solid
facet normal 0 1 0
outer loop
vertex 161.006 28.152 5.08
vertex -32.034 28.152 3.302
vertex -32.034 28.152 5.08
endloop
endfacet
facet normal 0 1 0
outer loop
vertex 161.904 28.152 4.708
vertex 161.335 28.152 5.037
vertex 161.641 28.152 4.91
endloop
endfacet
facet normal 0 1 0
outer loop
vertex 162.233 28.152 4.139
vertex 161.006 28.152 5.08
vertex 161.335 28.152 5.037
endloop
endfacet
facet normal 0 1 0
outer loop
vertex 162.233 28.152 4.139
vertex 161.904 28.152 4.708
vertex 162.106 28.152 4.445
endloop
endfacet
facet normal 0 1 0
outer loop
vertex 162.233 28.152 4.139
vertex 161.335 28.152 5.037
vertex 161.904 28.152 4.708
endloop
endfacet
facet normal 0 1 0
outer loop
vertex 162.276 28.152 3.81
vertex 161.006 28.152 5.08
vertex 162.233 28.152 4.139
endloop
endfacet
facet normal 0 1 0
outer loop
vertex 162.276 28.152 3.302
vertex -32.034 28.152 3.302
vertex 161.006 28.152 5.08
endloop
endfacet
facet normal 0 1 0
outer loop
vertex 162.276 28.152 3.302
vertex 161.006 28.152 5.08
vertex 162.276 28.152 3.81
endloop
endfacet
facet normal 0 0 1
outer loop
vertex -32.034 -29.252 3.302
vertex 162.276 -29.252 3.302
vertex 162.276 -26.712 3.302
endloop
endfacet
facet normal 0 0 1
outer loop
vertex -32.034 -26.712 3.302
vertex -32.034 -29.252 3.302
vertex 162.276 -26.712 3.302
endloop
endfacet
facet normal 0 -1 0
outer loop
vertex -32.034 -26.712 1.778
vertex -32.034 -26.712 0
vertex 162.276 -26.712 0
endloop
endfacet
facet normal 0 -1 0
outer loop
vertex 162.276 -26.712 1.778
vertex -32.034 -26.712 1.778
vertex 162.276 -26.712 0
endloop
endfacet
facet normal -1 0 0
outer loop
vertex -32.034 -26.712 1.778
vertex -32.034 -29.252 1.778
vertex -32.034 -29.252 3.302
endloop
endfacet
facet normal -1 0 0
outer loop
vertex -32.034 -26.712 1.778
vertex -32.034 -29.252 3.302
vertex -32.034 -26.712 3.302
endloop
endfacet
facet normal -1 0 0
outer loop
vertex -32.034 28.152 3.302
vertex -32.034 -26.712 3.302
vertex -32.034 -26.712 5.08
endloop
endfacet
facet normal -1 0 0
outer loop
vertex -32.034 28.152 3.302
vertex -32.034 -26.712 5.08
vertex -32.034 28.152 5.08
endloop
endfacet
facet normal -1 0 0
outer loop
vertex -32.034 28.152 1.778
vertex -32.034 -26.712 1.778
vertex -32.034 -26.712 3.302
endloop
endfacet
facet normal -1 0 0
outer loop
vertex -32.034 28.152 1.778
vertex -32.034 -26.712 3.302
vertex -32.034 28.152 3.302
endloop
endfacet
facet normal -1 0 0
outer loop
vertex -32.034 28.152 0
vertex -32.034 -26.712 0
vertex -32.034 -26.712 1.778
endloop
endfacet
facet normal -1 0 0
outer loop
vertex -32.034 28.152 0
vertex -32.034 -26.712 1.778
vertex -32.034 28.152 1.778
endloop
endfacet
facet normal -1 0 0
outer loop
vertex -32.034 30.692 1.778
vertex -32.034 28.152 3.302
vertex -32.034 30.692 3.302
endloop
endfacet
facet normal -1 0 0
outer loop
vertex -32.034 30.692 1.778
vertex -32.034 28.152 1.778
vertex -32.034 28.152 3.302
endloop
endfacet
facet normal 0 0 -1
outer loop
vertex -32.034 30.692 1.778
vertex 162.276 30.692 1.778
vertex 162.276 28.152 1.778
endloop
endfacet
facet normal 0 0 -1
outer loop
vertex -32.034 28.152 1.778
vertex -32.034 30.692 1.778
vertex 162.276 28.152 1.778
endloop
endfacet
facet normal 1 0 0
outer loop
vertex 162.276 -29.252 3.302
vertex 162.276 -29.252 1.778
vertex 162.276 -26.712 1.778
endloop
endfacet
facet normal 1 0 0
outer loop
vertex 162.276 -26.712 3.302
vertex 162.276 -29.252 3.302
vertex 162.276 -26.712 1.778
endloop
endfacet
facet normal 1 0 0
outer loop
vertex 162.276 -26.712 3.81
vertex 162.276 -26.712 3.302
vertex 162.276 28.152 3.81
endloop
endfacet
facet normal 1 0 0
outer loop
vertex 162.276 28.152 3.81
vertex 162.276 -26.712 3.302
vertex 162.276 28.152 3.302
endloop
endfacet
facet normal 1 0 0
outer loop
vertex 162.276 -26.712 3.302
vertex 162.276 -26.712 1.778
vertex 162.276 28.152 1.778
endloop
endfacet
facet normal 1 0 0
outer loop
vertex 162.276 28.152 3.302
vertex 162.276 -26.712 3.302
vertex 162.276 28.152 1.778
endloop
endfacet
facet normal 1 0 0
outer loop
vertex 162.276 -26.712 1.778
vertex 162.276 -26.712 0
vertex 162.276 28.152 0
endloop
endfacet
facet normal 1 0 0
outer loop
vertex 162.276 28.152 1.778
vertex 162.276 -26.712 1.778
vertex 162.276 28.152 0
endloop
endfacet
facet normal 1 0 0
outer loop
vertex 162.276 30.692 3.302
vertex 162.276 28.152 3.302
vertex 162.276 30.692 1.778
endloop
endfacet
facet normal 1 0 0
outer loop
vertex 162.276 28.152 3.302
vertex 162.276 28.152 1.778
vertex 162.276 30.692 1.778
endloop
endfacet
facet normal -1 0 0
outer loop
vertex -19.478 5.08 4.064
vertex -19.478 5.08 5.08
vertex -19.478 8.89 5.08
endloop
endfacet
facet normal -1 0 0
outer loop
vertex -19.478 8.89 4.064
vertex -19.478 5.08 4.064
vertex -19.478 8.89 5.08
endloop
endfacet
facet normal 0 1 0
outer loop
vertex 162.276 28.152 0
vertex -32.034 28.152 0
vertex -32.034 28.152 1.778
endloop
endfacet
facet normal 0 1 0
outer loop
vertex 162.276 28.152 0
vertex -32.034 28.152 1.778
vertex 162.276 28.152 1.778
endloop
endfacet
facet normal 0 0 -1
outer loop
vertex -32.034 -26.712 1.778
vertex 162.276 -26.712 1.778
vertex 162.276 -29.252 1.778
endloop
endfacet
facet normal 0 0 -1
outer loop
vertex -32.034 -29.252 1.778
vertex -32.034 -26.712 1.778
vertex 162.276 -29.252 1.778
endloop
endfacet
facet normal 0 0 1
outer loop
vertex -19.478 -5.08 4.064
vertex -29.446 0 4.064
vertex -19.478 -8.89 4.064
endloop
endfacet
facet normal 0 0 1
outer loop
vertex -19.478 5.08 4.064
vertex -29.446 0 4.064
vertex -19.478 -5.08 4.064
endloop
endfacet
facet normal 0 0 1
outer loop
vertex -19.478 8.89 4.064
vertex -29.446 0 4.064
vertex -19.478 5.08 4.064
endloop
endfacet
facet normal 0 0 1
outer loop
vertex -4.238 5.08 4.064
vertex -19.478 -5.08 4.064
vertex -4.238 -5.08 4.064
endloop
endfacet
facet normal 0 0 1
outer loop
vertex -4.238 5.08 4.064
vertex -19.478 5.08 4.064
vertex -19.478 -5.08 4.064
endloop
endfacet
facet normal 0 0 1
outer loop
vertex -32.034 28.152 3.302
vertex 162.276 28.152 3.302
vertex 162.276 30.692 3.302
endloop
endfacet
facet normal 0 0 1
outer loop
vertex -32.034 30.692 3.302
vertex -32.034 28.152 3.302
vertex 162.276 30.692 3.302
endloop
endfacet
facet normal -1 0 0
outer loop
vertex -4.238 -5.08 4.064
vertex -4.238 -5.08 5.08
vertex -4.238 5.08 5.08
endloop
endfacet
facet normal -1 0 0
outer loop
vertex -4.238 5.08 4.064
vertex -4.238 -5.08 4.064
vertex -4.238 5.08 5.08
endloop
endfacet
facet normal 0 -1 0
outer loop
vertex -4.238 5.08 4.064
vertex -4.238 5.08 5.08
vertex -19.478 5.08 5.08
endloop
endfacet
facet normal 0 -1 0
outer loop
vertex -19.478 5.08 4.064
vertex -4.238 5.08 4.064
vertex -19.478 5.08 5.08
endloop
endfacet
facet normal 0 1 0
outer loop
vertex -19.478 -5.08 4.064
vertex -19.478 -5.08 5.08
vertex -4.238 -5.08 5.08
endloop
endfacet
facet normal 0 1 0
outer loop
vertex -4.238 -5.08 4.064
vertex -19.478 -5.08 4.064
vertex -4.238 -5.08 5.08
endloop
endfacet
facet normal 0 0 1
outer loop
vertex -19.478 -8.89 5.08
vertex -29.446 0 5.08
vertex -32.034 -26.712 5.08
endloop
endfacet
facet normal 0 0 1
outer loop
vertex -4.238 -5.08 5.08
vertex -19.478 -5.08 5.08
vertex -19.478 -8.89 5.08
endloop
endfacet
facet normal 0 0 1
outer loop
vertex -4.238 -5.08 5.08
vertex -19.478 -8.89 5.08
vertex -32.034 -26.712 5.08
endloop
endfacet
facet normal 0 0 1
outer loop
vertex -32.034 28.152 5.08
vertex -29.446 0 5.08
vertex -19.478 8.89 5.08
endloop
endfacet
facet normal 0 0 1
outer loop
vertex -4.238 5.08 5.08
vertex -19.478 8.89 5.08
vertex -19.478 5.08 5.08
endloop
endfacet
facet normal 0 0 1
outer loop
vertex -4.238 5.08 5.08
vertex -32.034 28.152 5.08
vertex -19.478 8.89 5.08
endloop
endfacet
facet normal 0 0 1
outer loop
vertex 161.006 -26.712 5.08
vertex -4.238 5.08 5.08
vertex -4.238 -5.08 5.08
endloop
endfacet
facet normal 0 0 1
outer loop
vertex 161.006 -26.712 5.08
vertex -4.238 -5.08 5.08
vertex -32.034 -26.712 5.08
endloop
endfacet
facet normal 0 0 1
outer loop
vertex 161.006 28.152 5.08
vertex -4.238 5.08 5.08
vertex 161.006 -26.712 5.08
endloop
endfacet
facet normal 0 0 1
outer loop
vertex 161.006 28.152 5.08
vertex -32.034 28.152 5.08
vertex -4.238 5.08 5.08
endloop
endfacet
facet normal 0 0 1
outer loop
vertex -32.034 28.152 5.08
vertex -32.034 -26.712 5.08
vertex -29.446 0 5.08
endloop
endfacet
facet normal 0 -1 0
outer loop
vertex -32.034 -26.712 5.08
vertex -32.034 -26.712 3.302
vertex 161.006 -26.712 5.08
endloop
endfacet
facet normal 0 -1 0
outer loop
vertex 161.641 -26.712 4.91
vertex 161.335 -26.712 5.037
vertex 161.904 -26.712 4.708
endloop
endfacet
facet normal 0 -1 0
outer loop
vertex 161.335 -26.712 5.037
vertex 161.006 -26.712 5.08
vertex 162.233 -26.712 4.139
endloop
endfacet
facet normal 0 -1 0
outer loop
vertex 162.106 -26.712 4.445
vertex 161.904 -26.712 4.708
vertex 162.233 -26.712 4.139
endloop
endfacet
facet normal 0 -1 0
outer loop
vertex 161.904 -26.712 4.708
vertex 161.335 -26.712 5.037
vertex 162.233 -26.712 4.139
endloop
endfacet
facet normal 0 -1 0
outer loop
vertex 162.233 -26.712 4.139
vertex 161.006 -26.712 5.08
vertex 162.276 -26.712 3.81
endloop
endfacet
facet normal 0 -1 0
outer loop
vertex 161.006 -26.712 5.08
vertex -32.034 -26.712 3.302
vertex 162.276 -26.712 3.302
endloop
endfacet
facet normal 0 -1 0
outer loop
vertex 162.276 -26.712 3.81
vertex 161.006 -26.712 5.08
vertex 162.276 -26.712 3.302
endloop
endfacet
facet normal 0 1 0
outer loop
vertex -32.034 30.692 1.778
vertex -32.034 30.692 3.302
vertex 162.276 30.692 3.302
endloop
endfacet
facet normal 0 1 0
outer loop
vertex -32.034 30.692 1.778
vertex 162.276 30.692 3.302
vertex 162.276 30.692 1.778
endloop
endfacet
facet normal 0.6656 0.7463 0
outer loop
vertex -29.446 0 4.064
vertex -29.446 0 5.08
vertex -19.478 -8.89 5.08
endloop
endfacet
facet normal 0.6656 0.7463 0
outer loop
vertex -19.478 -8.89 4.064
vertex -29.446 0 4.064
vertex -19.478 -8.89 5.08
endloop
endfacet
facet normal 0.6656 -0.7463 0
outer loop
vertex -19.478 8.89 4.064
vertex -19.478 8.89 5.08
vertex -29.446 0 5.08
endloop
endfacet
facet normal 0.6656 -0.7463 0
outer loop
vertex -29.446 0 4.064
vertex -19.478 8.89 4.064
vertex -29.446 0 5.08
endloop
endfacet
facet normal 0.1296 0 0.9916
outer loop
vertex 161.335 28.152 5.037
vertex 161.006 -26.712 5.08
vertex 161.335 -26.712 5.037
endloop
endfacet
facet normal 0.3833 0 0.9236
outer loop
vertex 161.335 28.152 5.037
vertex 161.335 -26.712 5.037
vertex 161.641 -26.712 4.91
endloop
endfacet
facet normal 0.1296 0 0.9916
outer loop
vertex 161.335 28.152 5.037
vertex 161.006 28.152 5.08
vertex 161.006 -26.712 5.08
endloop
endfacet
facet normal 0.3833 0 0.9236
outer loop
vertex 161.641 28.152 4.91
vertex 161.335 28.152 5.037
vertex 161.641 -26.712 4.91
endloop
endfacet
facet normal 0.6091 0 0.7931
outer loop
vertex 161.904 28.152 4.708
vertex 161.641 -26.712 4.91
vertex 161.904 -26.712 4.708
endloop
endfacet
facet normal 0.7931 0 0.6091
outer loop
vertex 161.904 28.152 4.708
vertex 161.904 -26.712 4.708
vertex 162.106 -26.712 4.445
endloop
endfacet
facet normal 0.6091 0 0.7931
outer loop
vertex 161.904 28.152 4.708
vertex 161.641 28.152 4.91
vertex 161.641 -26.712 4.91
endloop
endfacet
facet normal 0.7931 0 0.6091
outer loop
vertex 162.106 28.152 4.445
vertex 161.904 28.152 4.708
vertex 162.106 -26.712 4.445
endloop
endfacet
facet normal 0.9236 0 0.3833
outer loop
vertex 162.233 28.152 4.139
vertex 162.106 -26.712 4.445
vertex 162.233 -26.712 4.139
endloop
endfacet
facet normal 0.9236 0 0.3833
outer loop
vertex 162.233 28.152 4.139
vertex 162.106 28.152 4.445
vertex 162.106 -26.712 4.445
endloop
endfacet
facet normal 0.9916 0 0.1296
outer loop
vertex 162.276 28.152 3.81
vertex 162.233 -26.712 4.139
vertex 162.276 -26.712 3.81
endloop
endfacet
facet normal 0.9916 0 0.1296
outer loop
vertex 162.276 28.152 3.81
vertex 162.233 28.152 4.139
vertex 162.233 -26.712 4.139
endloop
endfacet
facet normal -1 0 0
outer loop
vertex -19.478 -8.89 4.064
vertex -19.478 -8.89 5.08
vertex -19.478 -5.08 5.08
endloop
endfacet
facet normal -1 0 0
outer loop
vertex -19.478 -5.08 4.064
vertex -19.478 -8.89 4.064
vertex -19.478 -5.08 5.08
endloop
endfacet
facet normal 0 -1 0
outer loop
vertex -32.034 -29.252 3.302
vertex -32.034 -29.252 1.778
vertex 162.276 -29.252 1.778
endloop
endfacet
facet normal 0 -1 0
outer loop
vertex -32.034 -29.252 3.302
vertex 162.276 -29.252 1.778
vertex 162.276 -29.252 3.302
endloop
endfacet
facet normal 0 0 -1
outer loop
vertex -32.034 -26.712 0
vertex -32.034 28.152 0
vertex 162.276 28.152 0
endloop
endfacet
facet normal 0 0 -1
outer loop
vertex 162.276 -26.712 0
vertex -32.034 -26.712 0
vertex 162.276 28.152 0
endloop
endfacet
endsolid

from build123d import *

# Parameters (mm, degrees)
F0_W     = 194.31
F0_H     = 54.864
F1_DEPTH = 5.08
F3_DEPTH = 194.31
F4_R     = 1.27
F6_DEPTH = 1.016


with BuildPart() as f1:
    # F0 (on Top) → F1 (new body)
    with BuildSketch(Plane.XY):
        with Locations((65.120992, 0.720159)):
            Rectangle(F0_W, F0_H)
    extrude(amount=F1_DEPTH)

    # F2 (on face) → F3 (join, through all)
    with BuildSketch(Plane(origin=(-32.034008, 0, 0), x_dir=(0, -1, 0), z_dir=(-1, 0, 0))):
        Polygon((-28.152159, 1.778), (-28.152159, 3.302), (-30.692159, 3.302), (-30.692159, 2.54), (-30.692159, 1.778), align=None)
        Polygon((29.251841, 3.302), (26.711841, 3.302), (26.711841, 1.778), (29.251841, 1.778), (29.251841, 2.54), align=None)
    extrude(amount=-F3_DEPTH)

    # F4
    f4_edges = [f1.edges().sort_by_distance(p)[0] for p in [
        (162.275992, 0.720159, 5.08),
    ]]
    fillet(f4_edges, radius=F4_R)

    # F5 (on face) → F6 (cut)
    with BuildSketch(Plane.XY.offset(5.08)):
        Polygon((-4.237764, -5.08), (-4.237764, 0), (-4.237764, 5.08), (-19.477764, 5.08), (-19.477764, 8.89), (-29.445775, 0), (-19.477764, -8.89), (-19.477764, -5.08), align=None)
    extrude(amount=-F6_DEPTH, mode=Mode.SUBTRACT)


solid = f1.part
